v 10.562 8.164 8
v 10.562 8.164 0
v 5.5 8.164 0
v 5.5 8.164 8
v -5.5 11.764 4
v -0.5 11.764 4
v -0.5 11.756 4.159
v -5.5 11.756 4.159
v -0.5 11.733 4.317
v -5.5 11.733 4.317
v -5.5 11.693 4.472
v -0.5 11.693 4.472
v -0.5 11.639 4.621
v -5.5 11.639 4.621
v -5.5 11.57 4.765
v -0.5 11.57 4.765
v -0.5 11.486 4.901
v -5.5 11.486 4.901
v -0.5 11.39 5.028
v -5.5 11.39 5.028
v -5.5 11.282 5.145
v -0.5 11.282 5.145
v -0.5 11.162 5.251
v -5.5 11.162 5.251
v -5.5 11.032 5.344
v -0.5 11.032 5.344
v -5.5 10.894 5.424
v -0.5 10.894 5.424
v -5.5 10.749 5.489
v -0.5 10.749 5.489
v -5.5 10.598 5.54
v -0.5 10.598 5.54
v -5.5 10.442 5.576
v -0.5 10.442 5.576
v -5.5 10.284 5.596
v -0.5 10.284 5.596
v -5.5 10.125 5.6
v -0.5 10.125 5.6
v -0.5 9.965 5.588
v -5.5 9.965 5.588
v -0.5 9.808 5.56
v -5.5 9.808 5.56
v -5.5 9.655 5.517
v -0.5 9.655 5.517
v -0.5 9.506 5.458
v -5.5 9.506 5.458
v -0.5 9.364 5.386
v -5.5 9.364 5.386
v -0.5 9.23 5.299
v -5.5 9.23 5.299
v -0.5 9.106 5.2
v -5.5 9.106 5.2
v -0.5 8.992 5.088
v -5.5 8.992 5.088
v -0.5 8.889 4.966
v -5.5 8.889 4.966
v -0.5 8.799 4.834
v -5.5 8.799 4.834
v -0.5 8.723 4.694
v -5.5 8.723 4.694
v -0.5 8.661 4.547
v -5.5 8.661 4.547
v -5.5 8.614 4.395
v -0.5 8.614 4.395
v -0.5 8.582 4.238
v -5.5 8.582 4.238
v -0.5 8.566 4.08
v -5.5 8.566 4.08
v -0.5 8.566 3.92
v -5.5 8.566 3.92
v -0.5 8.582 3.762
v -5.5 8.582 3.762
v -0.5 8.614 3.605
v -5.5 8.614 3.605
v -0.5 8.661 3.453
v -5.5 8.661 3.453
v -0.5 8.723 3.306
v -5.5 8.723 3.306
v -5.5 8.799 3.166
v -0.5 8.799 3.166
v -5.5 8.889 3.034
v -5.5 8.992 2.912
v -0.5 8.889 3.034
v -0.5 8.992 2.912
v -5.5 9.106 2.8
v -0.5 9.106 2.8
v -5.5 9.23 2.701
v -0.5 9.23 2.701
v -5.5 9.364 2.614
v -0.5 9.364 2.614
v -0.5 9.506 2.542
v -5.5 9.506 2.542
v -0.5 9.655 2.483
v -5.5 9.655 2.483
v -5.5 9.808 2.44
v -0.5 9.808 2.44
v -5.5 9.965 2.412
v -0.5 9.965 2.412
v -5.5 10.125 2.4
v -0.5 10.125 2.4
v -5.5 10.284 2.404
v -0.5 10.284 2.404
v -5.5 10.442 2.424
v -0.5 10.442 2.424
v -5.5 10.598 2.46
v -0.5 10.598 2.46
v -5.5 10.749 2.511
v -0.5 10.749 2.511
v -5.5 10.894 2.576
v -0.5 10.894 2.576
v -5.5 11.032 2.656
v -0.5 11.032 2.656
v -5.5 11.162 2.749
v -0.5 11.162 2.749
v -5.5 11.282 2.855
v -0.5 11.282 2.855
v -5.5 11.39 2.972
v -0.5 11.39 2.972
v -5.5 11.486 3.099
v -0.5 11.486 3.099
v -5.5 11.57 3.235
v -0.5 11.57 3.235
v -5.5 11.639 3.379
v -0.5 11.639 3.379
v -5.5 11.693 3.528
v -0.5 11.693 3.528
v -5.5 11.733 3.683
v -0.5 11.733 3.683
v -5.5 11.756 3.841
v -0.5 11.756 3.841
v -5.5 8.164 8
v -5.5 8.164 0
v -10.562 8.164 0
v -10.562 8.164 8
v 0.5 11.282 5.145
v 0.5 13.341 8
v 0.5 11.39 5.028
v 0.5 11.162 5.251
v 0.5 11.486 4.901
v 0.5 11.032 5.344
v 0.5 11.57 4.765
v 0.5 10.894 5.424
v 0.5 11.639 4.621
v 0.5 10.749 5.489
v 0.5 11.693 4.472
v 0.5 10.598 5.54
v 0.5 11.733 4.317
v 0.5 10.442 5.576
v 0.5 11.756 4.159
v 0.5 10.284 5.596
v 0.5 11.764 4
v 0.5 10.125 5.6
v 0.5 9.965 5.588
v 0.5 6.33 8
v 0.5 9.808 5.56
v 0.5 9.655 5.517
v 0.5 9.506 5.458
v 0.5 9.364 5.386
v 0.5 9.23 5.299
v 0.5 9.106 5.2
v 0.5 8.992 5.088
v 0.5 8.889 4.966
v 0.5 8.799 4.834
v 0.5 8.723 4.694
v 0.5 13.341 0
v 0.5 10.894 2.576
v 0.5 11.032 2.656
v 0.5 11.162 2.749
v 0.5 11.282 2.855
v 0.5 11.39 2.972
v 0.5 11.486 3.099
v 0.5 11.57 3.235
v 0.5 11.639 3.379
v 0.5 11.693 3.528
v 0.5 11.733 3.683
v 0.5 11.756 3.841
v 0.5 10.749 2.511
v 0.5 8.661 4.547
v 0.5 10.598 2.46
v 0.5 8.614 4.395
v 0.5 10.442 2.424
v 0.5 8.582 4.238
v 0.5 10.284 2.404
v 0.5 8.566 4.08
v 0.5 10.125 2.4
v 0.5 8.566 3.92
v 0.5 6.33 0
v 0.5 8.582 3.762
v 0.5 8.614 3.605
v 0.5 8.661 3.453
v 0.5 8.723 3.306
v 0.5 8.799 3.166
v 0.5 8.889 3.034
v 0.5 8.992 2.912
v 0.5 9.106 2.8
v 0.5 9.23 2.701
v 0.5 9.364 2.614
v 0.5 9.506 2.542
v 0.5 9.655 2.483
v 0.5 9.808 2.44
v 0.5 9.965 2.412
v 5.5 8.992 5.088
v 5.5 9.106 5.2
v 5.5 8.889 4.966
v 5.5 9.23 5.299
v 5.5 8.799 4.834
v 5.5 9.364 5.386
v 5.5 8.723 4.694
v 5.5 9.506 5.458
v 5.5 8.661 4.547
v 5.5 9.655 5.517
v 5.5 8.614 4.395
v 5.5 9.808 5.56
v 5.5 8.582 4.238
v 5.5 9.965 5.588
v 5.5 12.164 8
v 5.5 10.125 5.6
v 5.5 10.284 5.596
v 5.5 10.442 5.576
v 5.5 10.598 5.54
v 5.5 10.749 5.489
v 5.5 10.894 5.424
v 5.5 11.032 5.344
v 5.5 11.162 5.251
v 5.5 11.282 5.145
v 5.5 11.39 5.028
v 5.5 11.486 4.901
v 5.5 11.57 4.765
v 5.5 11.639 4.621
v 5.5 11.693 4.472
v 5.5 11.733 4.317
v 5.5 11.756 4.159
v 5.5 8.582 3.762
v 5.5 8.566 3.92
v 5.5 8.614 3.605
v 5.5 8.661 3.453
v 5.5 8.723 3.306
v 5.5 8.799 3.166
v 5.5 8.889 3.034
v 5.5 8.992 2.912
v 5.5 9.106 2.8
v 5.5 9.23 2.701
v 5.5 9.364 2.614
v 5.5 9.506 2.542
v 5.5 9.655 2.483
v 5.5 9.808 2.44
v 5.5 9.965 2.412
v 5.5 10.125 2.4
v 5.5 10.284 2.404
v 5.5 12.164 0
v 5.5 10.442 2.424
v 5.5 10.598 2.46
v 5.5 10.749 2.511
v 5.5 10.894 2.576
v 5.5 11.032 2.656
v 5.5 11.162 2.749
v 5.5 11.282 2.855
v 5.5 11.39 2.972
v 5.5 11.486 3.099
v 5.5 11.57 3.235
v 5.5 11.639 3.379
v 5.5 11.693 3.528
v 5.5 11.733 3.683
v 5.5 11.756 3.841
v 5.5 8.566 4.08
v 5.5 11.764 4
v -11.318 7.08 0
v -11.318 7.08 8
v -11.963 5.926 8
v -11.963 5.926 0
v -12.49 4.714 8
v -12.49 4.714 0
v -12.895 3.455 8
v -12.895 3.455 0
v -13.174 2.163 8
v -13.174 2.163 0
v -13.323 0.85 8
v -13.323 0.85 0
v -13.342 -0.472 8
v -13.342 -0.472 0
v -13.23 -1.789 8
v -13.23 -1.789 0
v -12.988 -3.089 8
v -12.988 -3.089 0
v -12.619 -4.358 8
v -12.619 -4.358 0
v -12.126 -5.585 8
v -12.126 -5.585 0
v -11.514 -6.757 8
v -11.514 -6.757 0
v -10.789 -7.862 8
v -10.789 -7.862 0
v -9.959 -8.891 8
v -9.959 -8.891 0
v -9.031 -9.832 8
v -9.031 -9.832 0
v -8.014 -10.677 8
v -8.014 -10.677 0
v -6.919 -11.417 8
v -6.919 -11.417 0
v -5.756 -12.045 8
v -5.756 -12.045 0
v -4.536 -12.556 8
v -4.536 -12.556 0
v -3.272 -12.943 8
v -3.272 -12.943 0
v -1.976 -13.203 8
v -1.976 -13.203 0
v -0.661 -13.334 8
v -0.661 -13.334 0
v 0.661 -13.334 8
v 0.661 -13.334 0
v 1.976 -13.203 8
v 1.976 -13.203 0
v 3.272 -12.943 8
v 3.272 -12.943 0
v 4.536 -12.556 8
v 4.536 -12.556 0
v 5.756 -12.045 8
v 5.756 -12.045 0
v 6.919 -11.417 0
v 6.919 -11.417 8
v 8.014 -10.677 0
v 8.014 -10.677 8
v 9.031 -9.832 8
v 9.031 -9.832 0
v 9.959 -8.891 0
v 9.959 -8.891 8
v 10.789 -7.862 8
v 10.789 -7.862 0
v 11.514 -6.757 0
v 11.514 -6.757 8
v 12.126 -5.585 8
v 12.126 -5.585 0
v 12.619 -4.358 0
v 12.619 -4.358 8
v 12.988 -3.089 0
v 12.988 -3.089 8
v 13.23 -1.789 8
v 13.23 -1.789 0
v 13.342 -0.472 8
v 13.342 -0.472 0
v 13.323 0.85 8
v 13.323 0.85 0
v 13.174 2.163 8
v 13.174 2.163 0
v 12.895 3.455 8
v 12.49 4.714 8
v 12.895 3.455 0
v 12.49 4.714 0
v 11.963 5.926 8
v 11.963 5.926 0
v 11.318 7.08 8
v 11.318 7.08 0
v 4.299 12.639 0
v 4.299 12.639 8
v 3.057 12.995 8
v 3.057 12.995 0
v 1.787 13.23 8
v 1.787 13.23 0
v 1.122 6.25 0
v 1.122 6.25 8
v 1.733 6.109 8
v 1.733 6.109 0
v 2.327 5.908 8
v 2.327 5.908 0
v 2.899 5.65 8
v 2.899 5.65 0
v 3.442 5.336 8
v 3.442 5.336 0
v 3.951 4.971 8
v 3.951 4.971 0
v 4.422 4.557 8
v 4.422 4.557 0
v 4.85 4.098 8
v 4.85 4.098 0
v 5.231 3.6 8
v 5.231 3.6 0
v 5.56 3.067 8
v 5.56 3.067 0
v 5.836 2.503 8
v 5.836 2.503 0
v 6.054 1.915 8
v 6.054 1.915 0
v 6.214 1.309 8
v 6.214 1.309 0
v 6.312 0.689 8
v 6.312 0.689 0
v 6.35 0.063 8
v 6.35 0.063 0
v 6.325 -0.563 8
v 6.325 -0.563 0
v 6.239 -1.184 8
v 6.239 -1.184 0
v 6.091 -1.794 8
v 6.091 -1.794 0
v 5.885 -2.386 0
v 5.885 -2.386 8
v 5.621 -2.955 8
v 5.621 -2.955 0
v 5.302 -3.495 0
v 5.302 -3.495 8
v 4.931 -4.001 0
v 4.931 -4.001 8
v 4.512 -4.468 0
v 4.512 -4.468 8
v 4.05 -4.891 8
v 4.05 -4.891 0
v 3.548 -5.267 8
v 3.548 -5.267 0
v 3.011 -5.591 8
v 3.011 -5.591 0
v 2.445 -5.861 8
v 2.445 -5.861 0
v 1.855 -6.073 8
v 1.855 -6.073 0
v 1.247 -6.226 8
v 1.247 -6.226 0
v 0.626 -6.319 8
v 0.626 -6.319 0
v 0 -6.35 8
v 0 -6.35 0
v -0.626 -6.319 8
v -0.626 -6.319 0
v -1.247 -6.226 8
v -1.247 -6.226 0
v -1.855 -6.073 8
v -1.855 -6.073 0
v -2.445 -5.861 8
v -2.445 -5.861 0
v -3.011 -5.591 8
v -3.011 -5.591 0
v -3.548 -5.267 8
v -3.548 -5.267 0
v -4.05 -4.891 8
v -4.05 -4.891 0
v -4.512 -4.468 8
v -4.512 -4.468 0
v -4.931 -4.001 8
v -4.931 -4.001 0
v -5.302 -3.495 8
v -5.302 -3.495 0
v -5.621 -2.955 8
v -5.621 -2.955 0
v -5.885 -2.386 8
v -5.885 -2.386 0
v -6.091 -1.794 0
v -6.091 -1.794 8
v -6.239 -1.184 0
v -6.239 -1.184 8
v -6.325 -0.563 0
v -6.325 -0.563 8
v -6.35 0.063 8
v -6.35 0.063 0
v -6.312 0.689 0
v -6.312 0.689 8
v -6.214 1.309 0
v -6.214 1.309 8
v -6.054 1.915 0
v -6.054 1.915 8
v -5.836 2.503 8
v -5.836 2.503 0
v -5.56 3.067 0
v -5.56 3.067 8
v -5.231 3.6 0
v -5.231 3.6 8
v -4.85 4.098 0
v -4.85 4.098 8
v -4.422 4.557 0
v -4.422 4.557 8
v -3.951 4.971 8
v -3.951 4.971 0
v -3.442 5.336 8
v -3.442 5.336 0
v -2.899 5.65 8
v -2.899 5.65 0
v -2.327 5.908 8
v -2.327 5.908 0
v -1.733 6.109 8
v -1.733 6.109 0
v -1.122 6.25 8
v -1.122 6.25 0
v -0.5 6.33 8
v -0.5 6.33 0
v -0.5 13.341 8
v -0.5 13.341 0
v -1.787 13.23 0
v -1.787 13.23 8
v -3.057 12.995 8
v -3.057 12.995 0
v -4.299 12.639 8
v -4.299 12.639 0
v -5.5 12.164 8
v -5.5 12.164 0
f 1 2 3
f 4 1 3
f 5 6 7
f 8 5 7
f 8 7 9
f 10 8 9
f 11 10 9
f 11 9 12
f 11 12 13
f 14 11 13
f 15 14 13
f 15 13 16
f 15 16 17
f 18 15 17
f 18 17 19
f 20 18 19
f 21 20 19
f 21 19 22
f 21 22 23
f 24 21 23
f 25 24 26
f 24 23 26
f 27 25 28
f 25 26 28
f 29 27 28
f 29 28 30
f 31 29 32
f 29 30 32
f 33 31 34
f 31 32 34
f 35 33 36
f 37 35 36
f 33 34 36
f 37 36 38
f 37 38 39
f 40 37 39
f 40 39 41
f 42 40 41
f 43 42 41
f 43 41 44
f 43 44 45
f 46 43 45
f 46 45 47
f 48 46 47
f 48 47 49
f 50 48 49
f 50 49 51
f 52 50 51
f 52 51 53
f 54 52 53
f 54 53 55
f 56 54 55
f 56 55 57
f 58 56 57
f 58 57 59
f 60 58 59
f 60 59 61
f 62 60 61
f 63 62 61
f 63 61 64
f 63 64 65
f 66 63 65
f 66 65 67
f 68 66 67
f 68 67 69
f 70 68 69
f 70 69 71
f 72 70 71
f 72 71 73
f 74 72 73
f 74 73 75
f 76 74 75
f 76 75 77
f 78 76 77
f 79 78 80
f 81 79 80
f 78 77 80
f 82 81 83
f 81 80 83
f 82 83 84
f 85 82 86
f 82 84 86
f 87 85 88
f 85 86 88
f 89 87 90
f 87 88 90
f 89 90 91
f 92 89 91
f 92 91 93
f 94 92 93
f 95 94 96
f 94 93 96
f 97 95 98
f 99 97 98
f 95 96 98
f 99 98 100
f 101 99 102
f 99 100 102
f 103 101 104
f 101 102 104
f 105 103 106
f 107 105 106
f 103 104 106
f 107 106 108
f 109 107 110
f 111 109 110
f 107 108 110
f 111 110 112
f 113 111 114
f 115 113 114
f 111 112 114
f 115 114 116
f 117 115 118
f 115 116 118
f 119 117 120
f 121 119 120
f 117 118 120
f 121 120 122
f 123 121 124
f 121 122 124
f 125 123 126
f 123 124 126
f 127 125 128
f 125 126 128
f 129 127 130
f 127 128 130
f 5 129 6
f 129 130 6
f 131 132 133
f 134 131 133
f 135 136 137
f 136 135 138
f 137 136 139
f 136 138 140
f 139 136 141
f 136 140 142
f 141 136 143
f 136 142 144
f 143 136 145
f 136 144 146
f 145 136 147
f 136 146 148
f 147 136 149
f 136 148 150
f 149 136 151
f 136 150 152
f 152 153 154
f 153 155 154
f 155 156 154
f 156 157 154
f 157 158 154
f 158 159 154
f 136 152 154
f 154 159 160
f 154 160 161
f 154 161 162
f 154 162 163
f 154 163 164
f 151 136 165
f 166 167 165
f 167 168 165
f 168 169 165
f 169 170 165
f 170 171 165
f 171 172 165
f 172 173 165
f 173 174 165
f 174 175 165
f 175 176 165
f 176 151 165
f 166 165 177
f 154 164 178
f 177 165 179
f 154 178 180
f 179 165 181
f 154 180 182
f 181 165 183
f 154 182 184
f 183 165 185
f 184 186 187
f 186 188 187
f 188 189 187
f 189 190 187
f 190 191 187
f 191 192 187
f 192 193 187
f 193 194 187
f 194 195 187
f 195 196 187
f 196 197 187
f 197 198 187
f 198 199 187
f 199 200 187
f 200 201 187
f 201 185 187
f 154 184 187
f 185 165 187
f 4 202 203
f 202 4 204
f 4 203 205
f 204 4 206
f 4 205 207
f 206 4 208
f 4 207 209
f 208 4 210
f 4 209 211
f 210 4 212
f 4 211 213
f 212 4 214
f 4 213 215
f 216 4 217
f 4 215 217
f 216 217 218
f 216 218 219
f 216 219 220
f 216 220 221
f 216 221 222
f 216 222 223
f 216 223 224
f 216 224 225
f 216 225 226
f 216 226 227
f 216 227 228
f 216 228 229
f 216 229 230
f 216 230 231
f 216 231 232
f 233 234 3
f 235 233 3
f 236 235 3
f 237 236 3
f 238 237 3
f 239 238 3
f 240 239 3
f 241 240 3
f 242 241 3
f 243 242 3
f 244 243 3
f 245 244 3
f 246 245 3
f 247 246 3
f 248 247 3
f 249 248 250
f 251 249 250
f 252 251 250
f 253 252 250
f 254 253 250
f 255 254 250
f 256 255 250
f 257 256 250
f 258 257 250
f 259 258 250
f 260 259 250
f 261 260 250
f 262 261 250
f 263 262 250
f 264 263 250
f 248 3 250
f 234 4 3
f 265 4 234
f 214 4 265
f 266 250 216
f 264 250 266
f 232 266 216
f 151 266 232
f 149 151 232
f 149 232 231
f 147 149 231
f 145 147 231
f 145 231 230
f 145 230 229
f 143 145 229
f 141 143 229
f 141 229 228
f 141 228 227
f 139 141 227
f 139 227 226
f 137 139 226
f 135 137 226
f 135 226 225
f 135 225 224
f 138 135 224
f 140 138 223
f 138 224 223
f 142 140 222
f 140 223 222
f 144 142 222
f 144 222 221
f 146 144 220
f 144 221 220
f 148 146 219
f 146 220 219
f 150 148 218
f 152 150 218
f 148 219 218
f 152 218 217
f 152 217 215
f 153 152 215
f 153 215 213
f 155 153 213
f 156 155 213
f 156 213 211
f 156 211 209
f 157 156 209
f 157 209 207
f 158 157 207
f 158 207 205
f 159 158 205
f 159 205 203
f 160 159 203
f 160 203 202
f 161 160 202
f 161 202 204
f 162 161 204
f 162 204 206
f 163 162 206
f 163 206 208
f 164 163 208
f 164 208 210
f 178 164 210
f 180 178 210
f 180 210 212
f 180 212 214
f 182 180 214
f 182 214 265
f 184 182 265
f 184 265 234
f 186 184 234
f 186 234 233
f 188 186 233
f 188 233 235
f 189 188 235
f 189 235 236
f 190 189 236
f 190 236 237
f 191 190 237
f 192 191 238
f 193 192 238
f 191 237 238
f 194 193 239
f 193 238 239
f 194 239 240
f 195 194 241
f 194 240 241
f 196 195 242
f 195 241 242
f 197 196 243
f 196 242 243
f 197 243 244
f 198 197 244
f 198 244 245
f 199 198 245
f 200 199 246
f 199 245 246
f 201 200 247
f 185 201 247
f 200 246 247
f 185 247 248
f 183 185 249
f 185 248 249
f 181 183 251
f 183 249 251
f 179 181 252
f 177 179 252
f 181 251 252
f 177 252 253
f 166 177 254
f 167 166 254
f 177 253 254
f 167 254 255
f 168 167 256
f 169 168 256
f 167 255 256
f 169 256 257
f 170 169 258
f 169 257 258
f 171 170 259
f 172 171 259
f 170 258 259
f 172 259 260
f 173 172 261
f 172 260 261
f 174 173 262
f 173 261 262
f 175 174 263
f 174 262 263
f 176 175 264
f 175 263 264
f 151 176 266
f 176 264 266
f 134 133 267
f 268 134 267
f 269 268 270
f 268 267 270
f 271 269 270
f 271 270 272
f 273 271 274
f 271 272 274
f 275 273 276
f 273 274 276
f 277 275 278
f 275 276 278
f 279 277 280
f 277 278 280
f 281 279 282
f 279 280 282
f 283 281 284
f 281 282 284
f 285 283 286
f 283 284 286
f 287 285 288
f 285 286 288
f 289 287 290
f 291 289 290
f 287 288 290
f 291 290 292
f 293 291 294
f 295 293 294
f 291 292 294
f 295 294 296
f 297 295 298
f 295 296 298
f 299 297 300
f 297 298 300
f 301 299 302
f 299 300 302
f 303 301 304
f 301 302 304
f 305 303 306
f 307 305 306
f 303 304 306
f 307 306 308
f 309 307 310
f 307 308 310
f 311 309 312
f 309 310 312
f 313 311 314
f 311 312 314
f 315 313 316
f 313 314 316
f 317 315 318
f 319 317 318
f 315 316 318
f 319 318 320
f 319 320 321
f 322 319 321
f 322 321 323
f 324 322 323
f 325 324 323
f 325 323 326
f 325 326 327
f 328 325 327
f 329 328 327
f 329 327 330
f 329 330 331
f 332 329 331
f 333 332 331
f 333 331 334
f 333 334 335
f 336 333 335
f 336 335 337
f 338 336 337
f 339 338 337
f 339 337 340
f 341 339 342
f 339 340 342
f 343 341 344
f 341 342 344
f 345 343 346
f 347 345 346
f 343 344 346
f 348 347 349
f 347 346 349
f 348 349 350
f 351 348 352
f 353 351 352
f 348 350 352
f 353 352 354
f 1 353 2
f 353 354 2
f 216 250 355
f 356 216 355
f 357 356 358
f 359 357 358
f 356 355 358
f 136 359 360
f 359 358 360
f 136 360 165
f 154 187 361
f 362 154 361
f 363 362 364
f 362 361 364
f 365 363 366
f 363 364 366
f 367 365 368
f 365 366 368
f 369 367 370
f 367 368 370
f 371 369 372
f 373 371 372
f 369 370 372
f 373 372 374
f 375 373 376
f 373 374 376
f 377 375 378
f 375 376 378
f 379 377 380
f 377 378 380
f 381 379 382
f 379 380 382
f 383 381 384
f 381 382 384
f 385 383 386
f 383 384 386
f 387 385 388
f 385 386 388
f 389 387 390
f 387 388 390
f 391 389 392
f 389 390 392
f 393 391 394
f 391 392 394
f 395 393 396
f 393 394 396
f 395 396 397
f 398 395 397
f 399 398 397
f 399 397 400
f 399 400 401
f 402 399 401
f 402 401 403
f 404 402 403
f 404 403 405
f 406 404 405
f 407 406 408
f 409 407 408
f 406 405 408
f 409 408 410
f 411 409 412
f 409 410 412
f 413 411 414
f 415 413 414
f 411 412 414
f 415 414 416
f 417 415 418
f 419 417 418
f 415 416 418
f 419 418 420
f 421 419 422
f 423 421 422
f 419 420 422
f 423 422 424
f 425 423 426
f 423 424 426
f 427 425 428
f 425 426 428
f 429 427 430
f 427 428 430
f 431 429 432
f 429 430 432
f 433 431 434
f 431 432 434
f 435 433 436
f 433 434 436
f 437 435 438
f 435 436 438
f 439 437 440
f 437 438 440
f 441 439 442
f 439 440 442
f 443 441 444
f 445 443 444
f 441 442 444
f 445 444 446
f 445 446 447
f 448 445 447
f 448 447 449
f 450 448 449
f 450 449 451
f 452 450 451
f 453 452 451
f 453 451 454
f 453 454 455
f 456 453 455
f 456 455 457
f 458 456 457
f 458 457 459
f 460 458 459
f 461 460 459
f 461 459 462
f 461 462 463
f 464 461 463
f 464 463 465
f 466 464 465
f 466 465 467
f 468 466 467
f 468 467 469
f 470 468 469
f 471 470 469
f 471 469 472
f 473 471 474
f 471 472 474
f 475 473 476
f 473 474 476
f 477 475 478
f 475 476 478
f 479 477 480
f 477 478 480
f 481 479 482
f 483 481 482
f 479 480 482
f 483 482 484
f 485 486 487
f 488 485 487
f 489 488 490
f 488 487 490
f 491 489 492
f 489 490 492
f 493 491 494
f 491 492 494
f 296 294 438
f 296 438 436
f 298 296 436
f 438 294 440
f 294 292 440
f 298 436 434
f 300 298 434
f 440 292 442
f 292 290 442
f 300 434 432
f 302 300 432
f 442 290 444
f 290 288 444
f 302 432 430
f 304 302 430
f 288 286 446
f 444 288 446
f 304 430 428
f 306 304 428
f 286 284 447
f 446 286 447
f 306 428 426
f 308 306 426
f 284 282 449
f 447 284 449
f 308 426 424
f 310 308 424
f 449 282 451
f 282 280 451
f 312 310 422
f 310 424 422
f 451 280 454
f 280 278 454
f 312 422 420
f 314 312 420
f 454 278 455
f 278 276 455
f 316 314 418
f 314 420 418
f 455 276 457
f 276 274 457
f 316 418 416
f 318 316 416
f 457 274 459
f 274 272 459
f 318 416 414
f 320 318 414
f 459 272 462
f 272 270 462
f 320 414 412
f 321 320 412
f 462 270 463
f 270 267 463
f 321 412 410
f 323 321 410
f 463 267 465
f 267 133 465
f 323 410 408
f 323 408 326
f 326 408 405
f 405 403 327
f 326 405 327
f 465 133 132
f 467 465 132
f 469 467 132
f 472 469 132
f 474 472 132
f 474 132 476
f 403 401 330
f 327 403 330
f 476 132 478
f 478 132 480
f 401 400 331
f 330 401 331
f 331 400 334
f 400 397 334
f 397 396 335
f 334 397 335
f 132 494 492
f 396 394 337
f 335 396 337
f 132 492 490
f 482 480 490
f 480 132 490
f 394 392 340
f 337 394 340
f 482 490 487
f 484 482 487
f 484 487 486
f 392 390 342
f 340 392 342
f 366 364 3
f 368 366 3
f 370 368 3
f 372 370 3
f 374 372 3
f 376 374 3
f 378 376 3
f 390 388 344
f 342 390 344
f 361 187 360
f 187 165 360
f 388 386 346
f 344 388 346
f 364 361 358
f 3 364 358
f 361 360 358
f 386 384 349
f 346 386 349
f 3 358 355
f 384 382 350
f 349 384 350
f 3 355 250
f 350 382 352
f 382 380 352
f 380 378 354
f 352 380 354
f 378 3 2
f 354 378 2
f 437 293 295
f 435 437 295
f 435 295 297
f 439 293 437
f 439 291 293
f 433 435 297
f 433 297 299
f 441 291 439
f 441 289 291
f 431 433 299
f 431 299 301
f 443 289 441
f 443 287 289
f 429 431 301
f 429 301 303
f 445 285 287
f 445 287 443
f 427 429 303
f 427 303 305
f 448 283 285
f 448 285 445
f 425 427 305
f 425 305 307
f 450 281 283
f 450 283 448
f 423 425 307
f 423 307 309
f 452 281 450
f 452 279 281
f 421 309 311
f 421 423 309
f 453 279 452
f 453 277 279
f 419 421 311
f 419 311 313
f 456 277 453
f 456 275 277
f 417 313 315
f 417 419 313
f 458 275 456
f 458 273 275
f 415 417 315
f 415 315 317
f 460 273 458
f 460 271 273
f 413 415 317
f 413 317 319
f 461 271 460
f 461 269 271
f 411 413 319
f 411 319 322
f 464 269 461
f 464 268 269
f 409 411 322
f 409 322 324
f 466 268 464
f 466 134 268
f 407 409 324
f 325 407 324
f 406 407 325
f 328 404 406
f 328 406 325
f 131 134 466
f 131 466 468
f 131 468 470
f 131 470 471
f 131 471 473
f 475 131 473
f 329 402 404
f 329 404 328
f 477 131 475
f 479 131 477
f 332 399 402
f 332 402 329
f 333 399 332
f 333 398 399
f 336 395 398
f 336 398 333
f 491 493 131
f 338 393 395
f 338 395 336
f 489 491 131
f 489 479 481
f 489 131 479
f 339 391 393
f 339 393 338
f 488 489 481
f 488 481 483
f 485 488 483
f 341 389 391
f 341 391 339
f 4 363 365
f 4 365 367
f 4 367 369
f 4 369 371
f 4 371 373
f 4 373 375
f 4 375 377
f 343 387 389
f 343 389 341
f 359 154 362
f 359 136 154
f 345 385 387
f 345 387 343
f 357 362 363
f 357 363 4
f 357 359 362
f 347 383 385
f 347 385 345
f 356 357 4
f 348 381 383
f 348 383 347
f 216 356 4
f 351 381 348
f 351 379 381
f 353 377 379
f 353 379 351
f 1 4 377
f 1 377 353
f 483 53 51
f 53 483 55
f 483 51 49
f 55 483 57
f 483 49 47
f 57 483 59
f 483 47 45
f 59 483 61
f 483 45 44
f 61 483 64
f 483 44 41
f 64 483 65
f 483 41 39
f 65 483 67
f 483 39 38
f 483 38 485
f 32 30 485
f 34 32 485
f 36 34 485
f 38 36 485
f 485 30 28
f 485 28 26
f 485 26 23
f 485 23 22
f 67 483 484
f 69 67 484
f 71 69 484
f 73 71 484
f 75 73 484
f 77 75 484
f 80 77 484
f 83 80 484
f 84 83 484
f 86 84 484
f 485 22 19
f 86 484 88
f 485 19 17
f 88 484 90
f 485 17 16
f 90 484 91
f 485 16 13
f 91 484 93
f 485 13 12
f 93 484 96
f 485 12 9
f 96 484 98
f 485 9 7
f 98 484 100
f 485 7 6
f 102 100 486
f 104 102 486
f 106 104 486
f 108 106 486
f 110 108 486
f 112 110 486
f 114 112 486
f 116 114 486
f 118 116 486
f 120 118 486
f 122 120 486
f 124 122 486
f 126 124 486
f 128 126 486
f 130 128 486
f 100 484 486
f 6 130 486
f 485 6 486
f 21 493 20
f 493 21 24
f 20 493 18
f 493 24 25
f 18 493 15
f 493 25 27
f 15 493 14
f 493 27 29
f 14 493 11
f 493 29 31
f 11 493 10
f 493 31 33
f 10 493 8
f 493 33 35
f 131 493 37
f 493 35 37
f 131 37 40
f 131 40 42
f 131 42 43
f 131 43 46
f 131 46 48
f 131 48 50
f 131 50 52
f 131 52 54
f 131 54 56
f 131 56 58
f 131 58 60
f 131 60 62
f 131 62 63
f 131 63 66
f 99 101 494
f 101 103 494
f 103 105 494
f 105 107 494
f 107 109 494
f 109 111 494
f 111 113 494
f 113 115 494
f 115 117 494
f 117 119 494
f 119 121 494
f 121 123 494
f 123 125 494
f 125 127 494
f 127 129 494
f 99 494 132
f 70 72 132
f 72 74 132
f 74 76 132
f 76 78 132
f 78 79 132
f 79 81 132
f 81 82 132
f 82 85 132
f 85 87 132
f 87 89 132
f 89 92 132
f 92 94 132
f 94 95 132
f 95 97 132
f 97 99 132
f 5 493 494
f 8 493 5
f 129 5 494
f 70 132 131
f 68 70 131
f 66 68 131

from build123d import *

# Parameters (mm, degrees)
F1_DEPTH = 8
F2_R     = 1.6
F3_DEPTH = 25.4


with BuildPart() as f1:
    # F0 (on Top) → F1 (new body)
    with BuildSketch(Plane.XY):
        with BuildLine():
            ThreePointArc((0.5, 6.330284), (0, -6.35), (-0.5, 6.330284))
            Line((-0.5, 6.330284), (-0.5, 13.340633))
            ThreePointArc((-0.5, 13.340633), (-3.057104, 12.995254), (-5.5, 12.164395))
            Line((-5.5, 12.164395), (-5.5, 8.164395))
            Line((-5.5, 8.164395), (-10.562441, 8.164395))
            ThreePointArc((-10.562441, 8.164395), (0, -13.35), (10.562441, 8.164395))
            Line((10.562441, 8.164395), (5.5, 8.164395))
            Line((5.5, 8.164395), (5.5, 12.164395))
            ThreePointArc((5.5, 12.164395), (3.057104, 12.995254), (0.5, 13.340633))
            Line((0.5, 13.340633), (0.5, 6.330284))
        make_face()
    extrude(amount=F1_DEPTH)

    # F2 (on face) → F3 (cut)
    with BuildSketch(Plane.YZ.offset(5.5)):
        with Locations((10.164395, 4)):
            Circle(F2_R)
    extrude(amount=-F3_DEPTH, mode=Mode.SUBTRACT)


solid = f1.part
